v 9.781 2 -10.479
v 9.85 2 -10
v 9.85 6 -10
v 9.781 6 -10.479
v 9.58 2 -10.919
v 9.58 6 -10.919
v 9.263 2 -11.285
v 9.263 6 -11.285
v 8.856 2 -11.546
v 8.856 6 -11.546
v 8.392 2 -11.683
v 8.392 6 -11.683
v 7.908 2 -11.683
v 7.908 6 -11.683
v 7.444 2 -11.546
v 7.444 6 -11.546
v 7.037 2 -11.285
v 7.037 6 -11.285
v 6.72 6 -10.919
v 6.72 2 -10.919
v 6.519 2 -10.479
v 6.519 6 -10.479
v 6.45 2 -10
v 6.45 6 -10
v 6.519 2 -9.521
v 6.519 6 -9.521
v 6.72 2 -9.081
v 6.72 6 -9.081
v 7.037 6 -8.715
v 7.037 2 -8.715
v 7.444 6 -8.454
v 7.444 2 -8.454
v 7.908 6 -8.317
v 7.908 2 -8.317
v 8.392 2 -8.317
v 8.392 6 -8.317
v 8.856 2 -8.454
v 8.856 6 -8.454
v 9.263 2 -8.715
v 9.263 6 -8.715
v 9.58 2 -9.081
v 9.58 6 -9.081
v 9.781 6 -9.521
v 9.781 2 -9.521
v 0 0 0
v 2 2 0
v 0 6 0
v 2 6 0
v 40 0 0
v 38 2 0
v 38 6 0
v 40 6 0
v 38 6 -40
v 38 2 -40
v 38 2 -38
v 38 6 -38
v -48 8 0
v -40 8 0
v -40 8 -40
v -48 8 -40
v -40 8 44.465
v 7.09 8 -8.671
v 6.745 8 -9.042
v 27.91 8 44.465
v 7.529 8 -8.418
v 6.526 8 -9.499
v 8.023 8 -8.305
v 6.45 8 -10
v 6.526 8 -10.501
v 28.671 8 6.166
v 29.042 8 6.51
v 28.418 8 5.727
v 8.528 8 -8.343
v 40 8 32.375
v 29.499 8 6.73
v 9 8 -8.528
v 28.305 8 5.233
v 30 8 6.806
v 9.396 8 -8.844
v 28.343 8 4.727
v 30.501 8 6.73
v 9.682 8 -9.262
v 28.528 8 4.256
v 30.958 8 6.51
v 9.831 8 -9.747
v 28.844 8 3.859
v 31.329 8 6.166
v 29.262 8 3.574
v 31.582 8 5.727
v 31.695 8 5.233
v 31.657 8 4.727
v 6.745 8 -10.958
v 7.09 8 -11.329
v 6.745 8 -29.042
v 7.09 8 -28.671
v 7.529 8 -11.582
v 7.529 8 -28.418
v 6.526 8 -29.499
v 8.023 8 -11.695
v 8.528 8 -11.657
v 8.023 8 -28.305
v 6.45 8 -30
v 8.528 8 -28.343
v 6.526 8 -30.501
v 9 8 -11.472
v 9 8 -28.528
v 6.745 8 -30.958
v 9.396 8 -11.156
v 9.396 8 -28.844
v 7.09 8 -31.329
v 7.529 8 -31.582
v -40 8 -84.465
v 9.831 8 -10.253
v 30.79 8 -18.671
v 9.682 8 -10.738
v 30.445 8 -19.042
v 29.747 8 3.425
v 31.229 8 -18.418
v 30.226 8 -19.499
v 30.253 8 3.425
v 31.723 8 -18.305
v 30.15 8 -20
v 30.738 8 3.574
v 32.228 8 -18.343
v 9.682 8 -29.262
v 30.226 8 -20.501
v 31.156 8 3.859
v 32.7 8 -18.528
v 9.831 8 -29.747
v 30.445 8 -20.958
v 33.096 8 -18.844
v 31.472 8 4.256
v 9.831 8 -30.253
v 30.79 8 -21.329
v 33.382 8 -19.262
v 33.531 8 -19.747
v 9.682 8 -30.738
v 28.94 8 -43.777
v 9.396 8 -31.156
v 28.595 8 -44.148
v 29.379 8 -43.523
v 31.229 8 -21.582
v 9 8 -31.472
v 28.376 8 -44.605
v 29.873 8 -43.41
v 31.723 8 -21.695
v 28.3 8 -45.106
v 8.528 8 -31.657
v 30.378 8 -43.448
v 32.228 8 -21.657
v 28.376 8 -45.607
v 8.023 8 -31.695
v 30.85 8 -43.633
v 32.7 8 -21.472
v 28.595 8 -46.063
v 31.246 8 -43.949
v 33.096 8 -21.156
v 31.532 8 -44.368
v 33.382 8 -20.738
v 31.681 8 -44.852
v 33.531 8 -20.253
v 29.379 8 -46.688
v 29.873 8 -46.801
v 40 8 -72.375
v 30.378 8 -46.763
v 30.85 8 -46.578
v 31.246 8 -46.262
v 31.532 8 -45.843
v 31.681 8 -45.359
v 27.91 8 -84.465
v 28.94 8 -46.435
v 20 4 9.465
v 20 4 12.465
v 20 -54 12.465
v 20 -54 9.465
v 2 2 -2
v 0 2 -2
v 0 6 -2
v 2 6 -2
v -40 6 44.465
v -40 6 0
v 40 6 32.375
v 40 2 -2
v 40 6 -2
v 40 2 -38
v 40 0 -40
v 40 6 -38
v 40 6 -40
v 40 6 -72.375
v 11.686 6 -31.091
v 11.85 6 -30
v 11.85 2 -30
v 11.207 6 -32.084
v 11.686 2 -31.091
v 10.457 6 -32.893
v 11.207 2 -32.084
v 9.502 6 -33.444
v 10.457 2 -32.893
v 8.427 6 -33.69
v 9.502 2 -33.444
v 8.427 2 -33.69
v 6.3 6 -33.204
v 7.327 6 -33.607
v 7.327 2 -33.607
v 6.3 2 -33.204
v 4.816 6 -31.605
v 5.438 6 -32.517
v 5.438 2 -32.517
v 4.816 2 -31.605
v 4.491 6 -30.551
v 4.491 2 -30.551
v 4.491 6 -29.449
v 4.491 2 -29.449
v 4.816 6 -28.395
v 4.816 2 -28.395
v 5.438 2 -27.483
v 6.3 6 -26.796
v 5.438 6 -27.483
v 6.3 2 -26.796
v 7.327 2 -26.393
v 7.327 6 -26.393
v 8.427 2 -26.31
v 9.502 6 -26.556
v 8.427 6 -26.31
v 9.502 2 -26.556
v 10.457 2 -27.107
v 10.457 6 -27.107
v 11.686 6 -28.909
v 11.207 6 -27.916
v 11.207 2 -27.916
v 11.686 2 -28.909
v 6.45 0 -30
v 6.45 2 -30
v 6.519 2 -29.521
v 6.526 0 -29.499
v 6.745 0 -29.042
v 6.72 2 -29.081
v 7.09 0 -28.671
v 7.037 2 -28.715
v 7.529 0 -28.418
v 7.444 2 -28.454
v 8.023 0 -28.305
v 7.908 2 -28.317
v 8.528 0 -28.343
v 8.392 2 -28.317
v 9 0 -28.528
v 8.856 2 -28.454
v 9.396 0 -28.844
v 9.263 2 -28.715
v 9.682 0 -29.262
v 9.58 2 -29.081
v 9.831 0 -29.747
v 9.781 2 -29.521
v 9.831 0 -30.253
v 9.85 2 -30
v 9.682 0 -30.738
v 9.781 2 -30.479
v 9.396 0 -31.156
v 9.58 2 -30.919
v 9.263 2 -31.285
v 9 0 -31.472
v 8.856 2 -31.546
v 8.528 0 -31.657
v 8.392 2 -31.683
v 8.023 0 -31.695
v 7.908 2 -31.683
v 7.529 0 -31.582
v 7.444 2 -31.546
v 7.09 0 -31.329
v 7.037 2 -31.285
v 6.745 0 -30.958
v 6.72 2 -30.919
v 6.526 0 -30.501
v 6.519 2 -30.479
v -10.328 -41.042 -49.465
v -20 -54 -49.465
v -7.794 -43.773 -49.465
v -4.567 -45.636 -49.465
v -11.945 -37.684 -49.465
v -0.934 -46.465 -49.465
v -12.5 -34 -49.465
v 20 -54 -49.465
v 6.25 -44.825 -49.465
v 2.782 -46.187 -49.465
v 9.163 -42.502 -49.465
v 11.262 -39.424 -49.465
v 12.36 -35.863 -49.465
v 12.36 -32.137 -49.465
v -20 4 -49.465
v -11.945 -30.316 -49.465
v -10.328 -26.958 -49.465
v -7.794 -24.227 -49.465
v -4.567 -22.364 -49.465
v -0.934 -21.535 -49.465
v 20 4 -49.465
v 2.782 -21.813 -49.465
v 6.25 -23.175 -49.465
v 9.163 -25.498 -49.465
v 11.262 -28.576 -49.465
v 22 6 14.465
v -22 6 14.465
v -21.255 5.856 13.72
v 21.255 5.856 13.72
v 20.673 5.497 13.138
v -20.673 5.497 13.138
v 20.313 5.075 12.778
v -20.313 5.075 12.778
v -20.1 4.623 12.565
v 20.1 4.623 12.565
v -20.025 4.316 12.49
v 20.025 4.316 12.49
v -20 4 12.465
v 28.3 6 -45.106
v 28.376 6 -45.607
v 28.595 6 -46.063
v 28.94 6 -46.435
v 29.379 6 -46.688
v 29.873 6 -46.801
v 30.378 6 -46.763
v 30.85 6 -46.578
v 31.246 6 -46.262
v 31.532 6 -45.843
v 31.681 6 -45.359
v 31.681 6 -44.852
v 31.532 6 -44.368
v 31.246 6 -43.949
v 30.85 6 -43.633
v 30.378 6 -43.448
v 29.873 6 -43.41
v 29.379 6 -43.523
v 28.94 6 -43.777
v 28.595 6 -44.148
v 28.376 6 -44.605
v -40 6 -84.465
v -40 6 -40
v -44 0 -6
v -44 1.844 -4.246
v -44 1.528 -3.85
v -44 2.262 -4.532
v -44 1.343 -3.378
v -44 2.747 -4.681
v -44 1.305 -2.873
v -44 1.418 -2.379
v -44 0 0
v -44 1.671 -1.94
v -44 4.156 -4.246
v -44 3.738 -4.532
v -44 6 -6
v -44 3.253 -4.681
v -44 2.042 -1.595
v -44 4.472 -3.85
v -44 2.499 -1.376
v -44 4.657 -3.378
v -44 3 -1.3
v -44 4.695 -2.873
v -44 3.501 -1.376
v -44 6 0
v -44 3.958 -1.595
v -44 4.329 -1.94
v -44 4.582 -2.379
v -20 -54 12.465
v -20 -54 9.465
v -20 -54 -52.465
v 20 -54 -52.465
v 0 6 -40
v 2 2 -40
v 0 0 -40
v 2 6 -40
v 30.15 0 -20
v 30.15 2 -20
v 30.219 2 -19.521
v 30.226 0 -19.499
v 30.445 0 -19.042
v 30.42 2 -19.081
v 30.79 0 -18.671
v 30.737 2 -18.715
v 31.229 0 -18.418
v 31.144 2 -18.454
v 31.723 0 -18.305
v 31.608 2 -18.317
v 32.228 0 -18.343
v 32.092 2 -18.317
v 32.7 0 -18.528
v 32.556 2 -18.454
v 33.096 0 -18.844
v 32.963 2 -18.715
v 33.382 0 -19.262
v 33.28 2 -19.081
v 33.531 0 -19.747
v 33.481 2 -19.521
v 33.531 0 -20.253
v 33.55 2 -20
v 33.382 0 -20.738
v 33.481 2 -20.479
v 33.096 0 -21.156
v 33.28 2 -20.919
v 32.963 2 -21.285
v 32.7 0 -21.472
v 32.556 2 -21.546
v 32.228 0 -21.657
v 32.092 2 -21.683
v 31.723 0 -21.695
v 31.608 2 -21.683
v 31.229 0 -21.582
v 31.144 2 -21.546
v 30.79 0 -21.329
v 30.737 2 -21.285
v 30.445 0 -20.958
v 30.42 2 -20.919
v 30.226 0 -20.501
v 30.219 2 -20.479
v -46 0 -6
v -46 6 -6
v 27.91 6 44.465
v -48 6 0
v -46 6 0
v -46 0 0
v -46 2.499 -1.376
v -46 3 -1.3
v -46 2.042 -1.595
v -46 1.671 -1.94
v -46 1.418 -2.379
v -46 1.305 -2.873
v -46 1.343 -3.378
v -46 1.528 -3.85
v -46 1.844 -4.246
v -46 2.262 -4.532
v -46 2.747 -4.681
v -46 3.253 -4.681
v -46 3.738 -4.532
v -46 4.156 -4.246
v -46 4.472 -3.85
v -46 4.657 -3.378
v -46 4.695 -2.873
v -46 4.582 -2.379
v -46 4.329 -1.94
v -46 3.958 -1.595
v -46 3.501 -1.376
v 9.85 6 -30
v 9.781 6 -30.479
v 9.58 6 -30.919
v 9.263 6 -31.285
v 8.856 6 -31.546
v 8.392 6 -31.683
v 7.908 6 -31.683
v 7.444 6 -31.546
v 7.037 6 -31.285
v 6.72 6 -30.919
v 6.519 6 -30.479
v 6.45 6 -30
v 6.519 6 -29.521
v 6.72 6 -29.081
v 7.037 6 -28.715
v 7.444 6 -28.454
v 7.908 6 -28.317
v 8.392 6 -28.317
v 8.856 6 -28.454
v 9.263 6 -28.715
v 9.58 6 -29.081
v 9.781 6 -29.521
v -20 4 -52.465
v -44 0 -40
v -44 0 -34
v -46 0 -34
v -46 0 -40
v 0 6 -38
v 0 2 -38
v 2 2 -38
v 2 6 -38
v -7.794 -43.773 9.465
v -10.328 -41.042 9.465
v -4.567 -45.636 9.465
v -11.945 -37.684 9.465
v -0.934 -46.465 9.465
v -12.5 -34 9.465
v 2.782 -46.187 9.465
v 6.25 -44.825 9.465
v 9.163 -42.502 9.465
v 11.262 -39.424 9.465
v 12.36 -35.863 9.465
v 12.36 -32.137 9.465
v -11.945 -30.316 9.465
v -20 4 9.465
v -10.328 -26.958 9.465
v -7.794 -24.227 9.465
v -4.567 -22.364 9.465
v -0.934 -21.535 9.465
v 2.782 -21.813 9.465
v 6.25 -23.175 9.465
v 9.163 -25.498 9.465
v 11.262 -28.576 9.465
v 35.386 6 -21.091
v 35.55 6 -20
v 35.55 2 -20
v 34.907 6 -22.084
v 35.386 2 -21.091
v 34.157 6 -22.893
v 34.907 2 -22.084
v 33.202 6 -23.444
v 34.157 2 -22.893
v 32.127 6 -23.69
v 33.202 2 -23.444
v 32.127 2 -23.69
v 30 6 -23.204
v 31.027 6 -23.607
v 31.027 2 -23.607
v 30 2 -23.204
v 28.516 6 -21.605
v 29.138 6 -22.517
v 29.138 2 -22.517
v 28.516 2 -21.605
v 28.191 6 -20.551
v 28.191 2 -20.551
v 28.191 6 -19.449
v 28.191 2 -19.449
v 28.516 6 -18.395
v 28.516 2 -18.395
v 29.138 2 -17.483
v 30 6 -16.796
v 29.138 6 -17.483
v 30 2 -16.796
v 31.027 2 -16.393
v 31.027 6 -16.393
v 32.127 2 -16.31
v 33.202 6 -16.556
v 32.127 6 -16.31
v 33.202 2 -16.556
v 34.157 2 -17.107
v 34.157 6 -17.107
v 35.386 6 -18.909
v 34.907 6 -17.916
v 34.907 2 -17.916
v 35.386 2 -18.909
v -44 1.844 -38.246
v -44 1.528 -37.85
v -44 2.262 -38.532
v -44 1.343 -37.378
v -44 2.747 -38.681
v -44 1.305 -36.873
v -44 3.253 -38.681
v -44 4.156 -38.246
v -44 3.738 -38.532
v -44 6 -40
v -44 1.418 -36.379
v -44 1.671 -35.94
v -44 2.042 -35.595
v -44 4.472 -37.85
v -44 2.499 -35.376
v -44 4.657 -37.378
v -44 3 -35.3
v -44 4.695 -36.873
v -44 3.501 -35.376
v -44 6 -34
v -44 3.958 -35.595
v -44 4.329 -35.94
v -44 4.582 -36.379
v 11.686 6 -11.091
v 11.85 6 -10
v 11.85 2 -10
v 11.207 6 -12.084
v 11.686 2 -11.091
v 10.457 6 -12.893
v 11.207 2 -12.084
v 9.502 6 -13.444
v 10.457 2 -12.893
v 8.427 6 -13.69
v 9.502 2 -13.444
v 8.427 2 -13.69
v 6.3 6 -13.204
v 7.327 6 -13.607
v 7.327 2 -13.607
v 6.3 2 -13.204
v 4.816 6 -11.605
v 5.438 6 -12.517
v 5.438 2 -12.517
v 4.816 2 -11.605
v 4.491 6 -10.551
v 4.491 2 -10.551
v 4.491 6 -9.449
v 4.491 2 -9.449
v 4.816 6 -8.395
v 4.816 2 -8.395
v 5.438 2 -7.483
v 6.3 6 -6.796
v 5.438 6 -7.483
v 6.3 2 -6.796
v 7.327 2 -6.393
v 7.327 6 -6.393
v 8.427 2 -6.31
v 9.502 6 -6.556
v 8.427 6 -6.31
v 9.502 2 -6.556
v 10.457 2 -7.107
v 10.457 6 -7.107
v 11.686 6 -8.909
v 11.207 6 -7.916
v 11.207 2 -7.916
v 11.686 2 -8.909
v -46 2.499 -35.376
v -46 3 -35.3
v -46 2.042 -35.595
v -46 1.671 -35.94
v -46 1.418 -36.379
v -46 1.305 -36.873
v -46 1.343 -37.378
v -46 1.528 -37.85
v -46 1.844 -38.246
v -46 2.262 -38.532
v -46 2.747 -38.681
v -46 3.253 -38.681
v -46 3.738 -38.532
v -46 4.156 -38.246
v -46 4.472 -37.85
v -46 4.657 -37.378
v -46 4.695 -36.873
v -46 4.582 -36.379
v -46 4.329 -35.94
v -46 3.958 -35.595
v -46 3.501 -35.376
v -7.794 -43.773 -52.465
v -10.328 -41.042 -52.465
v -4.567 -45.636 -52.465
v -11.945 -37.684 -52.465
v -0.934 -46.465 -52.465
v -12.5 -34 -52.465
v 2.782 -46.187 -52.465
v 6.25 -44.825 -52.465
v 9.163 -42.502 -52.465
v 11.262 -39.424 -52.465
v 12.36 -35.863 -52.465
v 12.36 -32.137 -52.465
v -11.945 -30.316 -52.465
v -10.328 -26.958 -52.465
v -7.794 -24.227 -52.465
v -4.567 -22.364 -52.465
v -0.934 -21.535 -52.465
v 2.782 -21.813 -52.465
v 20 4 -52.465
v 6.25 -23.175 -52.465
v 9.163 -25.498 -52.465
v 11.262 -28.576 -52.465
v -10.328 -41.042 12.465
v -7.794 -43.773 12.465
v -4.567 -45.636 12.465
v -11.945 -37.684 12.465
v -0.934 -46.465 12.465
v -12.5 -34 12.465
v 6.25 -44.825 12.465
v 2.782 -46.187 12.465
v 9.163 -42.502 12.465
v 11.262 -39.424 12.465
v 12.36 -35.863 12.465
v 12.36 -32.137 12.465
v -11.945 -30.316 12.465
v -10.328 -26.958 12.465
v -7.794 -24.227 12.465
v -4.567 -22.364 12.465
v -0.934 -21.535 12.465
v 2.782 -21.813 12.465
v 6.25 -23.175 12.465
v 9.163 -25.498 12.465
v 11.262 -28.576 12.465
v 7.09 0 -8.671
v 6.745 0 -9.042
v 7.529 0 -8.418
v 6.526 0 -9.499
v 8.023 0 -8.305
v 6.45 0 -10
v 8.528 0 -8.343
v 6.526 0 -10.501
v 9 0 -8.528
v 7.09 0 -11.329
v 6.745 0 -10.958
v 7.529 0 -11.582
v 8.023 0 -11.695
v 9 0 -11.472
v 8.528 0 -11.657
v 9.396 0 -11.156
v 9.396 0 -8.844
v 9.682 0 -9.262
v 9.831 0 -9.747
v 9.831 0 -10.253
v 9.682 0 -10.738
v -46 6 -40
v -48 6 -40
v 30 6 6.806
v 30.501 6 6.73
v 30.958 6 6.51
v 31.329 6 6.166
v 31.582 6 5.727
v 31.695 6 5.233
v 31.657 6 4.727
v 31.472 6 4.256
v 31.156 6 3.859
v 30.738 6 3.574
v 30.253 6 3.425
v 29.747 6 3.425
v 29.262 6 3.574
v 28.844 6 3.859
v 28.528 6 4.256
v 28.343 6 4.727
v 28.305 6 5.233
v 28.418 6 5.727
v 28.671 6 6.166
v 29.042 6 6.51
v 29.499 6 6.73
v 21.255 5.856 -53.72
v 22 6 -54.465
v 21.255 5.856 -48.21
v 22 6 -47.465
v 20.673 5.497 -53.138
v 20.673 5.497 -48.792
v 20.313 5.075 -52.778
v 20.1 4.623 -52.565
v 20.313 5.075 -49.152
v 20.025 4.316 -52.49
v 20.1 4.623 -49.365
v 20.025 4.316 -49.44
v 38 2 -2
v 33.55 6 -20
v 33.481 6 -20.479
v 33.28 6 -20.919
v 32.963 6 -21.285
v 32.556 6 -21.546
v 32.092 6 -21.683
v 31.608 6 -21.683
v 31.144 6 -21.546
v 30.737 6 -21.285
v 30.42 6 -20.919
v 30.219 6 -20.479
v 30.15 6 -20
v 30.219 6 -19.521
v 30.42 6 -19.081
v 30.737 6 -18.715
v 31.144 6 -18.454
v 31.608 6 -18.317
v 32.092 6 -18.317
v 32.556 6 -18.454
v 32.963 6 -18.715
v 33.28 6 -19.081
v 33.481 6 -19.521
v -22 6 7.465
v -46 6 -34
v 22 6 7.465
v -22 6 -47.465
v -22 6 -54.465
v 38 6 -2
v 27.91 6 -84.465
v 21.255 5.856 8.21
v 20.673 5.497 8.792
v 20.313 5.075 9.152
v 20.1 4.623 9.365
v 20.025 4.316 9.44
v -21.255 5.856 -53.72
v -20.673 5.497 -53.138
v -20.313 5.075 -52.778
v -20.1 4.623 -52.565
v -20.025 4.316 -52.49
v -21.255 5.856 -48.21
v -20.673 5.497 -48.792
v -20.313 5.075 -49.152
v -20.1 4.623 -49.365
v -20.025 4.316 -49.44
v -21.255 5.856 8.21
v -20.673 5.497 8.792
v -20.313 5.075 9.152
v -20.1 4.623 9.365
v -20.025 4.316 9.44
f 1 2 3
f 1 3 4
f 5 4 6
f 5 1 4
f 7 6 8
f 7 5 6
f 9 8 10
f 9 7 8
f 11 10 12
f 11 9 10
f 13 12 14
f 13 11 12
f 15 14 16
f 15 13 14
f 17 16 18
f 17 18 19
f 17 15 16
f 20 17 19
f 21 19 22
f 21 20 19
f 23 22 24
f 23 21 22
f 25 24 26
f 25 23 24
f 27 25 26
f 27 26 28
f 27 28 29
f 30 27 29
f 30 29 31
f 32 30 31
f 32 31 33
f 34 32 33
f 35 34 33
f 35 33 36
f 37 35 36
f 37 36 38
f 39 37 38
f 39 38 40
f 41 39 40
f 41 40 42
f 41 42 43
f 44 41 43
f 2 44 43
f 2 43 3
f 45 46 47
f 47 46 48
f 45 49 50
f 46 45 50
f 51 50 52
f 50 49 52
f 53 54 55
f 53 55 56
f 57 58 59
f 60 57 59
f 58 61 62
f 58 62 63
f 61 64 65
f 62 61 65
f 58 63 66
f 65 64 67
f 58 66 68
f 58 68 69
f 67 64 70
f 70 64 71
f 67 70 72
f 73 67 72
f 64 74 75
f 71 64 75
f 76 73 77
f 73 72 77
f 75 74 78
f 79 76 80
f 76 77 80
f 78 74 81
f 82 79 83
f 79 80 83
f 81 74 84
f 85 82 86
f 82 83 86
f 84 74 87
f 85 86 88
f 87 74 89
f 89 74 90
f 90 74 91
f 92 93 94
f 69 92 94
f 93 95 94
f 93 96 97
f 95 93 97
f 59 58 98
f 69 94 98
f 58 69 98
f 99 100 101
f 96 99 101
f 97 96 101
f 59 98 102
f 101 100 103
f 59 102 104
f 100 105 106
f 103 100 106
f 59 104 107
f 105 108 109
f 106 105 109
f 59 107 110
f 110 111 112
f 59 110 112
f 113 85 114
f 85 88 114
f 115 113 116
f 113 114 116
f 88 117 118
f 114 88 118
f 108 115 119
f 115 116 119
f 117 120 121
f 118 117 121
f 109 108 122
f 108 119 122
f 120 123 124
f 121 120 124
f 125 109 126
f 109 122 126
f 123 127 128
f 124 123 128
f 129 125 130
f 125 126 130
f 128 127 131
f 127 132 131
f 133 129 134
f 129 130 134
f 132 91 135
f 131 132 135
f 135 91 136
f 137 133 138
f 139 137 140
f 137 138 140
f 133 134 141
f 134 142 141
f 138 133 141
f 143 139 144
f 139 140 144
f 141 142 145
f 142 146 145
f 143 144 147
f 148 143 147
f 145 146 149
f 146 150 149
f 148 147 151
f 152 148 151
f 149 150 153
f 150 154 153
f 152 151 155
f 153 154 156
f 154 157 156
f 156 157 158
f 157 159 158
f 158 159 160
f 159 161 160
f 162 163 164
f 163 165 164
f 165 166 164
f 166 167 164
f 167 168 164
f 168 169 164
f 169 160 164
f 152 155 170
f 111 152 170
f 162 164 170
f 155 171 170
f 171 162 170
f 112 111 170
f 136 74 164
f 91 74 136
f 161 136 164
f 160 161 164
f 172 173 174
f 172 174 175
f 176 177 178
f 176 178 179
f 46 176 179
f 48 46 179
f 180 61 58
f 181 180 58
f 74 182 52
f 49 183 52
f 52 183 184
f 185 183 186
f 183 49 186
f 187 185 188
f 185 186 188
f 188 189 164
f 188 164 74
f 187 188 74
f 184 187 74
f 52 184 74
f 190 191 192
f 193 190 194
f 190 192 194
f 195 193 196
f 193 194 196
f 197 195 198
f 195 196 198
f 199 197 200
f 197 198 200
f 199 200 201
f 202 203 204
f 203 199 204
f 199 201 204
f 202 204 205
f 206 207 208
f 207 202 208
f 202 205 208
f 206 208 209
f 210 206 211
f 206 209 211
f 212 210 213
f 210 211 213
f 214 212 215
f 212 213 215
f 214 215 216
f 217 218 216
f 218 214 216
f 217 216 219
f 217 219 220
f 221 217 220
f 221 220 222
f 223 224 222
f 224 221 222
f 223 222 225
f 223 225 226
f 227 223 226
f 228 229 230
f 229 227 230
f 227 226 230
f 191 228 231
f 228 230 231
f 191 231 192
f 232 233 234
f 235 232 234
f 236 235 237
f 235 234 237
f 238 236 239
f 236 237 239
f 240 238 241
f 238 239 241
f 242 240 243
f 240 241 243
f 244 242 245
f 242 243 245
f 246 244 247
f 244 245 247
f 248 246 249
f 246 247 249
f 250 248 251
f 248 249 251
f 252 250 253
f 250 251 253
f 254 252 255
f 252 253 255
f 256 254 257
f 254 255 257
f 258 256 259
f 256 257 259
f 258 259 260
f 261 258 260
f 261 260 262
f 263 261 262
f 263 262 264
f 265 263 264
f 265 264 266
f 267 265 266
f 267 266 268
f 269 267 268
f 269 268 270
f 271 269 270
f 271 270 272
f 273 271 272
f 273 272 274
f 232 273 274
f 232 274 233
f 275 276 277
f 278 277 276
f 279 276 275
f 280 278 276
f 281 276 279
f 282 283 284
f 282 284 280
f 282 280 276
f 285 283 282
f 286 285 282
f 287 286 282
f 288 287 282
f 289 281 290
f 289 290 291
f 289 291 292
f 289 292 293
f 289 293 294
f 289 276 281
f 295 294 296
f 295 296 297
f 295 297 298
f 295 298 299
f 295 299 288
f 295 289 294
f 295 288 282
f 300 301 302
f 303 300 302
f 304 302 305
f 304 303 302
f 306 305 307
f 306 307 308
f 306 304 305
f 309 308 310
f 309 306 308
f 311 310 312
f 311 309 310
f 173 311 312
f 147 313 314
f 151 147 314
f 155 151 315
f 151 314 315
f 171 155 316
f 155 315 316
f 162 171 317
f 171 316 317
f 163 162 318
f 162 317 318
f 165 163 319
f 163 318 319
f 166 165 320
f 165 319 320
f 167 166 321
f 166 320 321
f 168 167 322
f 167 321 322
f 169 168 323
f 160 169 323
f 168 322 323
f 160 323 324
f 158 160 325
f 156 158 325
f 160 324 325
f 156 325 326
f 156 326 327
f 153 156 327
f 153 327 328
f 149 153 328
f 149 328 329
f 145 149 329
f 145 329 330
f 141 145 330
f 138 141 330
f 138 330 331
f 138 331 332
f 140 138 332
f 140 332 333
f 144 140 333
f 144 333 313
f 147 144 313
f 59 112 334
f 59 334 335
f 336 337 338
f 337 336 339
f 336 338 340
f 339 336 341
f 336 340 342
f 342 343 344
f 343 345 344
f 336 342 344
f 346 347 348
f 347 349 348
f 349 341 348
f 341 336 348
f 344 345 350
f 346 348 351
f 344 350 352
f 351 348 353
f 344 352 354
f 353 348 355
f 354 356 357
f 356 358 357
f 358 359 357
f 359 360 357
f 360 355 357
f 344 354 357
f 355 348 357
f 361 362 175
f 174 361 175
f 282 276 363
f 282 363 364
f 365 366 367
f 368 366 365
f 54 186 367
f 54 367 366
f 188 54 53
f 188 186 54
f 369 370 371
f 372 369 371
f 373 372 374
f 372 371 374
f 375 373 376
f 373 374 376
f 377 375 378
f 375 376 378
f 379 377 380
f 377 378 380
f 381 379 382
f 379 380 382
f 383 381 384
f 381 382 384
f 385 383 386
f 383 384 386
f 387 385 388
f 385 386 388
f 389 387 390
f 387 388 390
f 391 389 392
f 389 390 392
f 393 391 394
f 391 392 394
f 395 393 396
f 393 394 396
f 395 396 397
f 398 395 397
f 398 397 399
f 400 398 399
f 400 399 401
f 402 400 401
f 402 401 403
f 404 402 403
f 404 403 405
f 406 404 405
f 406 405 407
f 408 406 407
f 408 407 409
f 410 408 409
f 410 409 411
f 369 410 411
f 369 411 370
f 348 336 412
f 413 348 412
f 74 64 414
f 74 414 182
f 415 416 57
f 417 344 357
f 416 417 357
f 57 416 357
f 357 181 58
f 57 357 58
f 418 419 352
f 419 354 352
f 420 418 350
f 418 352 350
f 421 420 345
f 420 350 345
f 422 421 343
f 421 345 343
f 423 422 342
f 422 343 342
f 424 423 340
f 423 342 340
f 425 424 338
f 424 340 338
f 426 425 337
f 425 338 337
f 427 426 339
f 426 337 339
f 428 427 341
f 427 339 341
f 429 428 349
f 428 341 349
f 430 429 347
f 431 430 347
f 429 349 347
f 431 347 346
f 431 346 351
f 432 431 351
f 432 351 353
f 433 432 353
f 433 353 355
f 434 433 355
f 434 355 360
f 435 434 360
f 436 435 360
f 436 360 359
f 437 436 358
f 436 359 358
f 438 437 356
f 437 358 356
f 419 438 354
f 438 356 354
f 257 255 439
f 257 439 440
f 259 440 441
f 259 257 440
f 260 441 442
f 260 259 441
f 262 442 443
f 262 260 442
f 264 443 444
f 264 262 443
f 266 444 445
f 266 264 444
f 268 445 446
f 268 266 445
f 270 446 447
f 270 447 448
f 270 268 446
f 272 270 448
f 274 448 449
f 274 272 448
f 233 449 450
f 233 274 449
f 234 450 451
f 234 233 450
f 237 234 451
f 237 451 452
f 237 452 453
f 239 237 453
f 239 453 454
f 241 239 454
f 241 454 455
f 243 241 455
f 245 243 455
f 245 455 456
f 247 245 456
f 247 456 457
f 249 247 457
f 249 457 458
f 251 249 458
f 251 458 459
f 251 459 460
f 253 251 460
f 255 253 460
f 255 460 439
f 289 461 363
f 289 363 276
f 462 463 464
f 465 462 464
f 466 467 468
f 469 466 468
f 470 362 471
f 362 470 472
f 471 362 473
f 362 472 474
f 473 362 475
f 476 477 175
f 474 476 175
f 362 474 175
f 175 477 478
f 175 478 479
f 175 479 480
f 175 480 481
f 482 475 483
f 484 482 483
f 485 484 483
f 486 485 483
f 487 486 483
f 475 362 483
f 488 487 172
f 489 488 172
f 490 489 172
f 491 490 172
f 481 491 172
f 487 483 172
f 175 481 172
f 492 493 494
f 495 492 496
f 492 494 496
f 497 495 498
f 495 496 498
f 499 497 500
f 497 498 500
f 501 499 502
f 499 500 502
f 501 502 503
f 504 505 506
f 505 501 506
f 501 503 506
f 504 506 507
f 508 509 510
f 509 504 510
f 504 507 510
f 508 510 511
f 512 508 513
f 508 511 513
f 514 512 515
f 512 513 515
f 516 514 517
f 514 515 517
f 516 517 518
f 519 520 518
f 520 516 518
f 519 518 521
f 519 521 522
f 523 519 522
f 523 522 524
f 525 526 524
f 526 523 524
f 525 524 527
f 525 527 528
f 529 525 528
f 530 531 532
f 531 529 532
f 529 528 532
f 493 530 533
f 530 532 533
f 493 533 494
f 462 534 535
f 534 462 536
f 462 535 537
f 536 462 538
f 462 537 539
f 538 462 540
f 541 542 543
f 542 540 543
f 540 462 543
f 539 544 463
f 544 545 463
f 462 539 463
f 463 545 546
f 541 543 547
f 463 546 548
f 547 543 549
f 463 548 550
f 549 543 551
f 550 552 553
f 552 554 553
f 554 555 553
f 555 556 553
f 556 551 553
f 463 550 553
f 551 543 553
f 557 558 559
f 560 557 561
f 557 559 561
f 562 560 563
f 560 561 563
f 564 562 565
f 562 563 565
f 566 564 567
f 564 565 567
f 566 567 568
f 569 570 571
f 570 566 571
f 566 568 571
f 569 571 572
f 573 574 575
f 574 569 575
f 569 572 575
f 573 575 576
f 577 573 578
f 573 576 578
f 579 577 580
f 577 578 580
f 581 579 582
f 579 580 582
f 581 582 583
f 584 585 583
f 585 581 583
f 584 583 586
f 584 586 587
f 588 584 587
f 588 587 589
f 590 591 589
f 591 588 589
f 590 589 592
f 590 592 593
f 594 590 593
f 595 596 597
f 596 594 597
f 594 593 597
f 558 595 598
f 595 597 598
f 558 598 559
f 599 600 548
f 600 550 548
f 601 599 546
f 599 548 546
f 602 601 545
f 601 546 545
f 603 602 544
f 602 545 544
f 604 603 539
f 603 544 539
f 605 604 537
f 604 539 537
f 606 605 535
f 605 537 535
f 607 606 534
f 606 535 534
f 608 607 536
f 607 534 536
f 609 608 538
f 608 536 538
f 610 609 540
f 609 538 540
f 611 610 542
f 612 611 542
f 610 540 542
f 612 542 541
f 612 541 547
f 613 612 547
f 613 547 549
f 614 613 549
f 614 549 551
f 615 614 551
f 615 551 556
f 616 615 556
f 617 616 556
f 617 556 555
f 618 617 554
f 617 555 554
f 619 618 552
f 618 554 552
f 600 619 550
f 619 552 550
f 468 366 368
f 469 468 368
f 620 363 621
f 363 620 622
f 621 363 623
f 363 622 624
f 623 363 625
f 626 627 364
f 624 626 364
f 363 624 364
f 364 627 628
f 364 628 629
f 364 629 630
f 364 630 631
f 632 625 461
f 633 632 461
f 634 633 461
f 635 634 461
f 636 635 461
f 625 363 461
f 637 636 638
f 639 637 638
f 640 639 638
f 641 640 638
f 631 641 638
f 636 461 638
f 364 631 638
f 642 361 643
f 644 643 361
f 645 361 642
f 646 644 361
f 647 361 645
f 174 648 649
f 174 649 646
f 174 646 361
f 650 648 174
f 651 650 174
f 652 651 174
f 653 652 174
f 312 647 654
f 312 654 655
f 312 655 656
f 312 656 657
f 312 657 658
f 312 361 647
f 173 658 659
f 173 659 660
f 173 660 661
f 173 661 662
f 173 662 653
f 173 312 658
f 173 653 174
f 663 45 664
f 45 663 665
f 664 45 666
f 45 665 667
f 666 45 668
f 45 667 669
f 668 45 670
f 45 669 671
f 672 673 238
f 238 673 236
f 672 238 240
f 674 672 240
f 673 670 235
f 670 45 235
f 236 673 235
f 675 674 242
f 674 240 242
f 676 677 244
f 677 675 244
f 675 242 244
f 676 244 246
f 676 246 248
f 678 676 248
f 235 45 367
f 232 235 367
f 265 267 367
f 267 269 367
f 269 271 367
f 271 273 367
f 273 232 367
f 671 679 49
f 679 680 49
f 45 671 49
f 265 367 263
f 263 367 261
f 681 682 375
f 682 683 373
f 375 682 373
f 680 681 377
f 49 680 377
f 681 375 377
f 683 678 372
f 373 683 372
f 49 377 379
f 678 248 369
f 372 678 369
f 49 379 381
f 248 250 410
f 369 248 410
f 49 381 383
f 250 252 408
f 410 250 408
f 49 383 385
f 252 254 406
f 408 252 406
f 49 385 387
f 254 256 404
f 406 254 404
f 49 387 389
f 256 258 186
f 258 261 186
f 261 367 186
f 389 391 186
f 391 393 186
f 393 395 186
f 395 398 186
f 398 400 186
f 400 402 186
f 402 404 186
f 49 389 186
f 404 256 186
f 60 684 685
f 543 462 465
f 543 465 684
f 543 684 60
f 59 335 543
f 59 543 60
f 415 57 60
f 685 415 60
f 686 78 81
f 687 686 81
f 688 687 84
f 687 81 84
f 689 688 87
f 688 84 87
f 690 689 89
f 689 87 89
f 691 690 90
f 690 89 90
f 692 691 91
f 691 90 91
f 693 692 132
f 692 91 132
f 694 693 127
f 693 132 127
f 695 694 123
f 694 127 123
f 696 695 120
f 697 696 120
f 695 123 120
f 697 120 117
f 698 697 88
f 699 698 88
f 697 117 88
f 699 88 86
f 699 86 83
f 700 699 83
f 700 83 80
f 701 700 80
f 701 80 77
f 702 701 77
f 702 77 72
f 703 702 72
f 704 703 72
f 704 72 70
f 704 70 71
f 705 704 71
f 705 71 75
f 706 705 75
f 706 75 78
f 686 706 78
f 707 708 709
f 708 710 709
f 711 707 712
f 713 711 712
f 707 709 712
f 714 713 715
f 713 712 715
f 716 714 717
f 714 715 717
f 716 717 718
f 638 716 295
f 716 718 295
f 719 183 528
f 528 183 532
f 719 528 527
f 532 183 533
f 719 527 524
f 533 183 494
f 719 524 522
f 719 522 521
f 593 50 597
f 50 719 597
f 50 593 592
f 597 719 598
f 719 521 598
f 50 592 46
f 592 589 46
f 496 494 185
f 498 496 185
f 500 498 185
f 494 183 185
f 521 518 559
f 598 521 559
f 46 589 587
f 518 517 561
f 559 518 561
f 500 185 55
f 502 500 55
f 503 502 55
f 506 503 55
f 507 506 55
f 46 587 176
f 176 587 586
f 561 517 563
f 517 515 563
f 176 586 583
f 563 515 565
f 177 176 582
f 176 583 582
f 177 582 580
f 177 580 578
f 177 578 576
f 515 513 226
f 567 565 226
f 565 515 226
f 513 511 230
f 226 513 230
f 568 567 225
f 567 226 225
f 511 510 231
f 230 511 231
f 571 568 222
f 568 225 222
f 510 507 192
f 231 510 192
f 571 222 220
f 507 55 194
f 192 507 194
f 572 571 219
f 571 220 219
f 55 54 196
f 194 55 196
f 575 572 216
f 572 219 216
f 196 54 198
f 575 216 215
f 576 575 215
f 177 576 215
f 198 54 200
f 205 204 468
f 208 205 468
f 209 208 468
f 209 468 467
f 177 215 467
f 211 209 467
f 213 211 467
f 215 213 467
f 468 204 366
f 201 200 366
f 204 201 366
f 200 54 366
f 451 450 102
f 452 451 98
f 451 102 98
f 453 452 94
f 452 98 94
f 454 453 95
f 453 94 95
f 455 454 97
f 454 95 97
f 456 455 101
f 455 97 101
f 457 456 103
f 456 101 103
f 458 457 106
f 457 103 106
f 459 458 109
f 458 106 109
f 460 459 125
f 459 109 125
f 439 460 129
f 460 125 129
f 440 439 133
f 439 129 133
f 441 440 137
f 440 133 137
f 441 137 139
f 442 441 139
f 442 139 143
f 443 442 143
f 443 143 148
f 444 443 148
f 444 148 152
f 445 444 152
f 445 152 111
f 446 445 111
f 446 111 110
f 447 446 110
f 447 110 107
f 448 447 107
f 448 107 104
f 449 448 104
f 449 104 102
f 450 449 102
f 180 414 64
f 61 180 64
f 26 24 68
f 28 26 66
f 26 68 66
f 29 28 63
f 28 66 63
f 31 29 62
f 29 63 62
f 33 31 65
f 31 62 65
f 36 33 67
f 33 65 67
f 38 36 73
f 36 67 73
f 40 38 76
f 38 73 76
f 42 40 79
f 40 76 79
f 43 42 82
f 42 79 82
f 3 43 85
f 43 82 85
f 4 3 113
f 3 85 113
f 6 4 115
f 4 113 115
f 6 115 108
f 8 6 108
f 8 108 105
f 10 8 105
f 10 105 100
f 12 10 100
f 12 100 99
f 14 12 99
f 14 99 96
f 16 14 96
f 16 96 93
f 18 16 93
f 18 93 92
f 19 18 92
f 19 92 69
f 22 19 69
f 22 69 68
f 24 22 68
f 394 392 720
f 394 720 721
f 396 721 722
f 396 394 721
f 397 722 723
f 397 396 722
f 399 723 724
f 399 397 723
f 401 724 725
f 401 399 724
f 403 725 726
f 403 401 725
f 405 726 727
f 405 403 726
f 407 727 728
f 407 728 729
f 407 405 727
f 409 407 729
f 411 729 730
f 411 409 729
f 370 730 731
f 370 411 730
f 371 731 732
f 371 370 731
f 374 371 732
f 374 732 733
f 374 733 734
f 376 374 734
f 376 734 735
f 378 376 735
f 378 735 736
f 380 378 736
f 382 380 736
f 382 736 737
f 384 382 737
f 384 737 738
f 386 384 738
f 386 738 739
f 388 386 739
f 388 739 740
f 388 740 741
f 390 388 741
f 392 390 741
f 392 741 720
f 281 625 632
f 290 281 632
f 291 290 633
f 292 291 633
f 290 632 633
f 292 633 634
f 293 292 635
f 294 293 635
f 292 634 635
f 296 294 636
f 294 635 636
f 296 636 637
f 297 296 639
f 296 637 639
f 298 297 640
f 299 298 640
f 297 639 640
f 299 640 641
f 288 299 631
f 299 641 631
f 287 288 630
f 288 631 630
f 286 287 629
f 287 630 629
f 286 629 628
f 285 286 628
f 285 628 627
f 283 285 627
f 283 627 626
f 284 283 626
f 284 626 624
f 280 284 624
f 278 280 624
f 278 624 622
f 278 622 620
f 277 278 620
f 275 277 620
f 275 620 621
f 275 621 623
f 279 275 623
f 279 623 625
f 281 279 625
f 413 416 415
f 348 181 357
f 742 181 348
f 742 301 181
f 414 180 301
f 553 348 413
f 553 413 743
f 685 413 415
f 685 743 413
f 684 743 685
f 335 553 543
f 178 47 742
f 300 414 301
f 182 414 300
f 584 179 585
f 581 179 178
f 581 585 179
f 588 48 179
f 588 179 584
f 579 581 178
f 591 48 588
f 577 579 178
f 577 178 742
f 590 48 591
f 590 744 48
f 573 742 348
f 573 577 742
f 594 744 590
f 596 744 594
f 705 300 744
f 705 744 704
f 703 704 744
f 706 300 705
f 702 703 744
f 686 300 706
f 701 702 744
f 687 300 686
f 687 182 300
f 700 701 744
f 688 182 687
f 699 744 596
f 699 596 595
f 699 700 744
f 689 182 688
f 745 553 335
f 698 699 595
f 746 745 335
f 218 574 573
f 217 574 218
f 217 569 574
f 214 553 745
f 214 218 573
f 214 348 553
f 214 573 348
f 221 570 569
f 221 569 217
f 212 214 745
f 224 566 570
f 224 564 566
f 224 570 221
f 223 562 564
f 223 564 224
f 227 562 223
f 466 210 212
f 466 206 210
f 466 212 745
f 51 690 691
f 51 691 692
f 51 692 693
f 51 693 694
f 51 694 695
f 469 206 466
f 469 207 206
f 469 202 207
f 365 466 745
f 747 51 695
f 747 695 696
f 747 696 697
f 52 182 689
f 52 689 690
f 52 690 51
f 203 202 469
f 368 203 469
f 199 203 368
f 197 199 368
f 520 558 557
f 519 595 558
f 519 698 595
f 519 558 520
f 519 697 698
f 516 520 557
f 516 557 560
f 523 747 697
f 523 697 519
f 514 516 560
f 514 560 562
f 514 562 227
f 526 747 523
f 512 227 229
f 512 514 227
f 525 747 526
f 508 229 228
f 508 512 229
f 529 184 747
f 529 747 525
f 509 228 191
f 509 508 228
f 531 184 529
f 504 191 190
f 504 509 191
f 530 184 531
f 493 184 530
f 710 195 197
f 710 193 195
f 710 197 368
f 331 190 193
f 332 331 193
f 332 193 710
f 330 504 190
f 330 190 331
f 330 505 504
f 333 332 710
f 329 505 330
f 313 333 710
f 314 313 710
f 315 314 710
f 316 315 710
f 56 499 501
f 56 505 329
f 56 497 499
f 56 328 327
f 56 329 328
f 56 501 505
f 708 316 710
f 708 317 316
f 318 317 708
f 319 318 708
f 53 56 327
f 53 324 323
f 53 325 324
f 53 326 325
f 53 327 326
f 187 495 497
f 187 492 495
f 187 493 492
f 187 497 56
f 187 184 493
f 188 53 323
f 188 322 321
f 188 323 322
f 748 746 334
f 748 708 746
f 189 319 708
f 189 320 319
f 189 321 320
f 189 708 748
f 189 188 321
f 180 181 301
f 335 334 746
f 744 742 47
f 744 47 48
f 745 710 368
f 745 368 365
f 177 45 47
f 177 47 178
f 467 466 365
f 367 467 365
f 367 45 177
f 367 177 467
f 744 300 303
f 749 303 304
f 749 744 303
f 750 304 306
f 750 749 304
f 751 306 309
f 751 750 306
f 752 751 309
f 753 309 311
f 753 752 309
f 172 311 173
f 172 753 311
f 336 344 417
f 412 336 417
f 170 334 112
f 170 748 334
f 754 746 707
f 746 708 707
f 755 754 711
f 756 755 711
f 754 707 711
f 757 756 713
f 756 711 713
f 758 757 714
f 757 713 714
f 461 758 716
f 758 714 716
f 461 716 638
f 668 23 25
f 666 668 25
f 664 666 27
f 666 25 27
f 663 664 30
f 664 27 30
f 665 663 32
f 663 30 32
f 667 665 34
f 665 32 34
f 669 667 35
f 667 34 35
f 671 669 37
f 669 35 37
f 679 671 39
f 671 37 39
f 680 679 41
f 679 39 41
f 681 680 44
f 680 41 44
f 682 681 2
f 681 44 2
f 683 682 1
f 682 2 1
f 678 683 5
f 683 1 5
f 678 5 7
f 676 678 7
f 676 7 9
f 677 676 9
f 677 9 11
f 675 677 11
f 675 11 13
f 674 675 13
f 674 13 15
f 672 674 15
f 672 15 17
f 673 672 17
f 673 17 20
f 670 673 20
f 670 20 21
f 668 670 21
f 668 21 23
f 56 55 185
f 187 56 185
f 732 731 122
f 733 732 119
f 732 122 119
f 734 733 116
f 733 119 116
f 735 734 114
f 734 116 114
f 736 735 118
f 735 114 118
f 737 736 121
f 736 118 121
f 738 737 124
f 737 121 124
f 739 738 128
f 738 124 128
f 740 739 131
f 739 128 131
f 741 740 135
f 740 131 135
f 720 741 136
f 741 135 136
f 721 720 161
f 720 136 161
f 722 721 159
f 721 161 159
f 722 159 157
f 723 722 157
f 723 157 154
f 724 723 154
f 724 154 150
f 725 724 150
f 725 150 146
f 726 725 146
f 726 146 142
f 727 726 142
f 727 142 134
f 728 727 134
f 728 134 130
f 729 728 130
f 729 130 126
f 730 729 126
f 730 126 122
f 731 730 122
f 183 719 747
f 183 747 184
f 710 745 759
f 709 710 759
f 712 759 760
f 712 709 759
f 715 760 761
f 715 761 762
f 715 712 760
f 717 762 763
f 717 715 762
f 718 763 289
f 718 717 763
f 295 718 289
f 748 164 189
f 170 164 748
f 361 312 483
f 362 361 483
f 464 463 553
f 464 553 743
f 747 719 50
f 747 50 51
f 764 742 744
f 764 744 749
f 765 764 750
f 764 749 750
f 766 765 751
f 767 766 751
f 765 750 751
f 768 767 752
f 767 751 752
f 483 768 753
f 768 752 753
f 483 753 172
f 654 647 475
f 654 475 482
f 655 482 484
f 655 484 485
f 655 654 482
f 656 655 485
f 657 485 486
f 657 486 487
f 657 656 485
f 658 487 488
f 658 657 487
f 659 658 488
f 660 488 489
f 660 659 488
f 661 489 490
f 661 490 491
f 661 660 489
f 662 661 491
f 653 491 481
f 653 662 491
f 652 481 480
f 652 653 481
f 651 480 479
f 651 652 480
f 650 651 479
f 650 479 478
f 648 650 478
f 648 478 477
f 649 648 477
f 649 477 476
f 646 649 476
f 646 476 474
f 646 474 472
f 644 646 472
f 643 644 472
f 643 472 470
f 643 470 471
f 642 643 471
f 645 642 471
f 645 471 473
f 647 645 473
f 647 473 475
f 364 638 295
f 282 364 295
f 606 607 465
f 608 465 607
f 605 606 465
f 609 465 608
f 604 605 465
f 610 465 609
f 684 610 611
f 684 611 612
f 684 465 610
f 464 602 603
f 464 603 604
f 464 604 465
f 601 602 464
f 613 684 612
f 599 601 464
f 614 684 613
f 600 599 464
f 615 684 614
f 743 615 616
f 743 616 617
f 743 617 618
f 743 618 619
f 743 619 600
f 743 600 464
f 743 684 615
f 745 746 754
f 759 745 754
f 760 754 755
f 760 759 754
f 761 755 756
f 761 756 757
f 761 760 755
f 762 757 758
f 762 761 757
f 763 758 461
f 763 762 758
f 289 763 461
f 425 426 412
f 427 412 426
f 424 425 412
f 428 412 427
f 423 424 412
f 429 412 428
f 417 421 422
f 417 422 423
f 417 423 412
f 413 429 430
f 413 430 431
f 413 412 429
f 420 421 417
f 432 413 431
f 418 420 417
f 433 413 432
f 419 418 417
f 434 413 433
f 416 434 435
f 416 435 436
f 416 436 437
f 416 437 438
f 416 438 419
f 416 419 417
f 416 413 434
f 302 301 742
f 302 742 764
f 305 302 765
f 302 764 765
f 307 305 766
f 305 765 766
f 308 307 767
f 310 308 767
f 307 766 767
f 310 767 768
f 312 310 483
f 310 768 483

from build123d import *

# Parameters (mm, degrees)
SKETCH1_W                = 40
SKETCH1_H                = 40
BOSS_EXTRUDE1_DEPTH      = 2
SKETCH10_W               = 40
SKETCH10_H               = 2
BOSS_EXTRUDE4_DEPTH      = 4
SKETCH11_W               = 40
SKETCH11_H               = 40
BOSS_EXTRUDE5_DEPTH      = 2
M3_CLEARANCE_HOLE1_D     = 3.4
SKETCH5_W                = 40
SKETCH5_H                = 2
BOSS_EXTRUDE2_DEPTH      = 48
SKETCH6_W                = 2
SKETCH6_H                = 40
BOSS_EXTRUDE3_DEPTH      = 6
SKETCH7_W                = 2
SKETCH7_H                = 28
CUT_EXTRUDE1_DEPTH       = 6
M3_CLEARANCE_HOLE2_D     = 3.4
M3_CLEARANCE_HOLE2_DEPTH = 2
M3_CLEARANCE_HOLE2_TIP   = 1.021463052
SKETCH12_W               = 36
SKETCH12_H               = 4
CUT_EXTRUDE2_DEPTH       = 63.992062992
EXTRUDE_THIN1_REACH      = 64.769
SKETCH13_R               = 3.7
SKETCH13_R_2             = 1.7
SKETCH14_W               = 40
SKETCH14_H               = 2
BOSS_EXTRUDE6_DEPTH      = 44.465
M3_CLEARANCE_HOLE3_D     = 3.4
SKETCH19_W               = 40
SKETCH19_H               = 2
BOSS_EXTRUDE7_DEPTH      = 44.465
SKETCH20_R               = 1.7
CUT_EXTRUDE3_DEPTH       = 98.479927293
CUT_EXTRUDE4_DEPTH       = 98.479927293
SKETCH24_W               = 44.465
SKETCH24_H               = 2
BOSS_EXTRUDE9_DEPTH      = 40
SKETCH22_W               = 40
SKETCH22_H               = 3
BOSS_EXTRUDE8_DEPTH      = 60
FILLET1_R                = 2
CUT_EXTRUDE5_REACH       = 122.894
SKETCH23_R               = 12.5
FILLET1_OF_MIRROR1_R     = 2


with BuildPart() as part:
    # Sketch1 → Boss-Extrude1 (new body)
    with BuildSketch(Plane(origin=(0, 0, 0), x_dir=(1, 0, 0), z_dir=(0, 1, 0))):
        with Locations((20, 20)):
            Rectangle(SKETCH1_W, SKETCH1_H)
    extrude(amount=BOSS_EXTRUDE1_DEPTH)

    # Sketch10 → Boss-Extrude4 (add)
    with BuildSketch(Plane(origin=(0, 2, 0), x_dir=(1, 0, 0), z_dir=(0, 1, 0))):
        with Locations((20, 1)):
            Rectangle(SKETCH10_W, SKETCH10_H)
        with Locations((20, 39)):
            Rectangle(SKETCH10_W, SKETCH10_H)
    extrude(amount=BOSS_EXTRUDE4_DEPTH)

    # Sketch11 → Boss-Extrude5 (add)
    with BuildSketch(Plane(origin=(0, 6, 0), x_dir=(1, 0, 0), z_dir=(0, 1, 0))):
        with Locations((20, 20)):
            Rectangle(SKETCH11_W, SKETCH11_H)
    extrude(amount=BOSS_EXTRUDE5_DEPTH)

    # M3 Clearance Hole1 (through all)
    with Locations(Plane.XZ):
        with Locations((8.15, -30), (8.15, -10), (31.85, -20)):
            Hole(M3_CLEARANCE_HOLE1_D / 2)

    # Sketch5 → Boss-Extrude2 (add)
    with BuildSketch(Plane(origin=(0, 0, 0), x_dir=(0, 0, -1), z_dir=(1, 0, 0))):
        with Locations((20, 7)):
            Rectangle(SKETCH5_W, SKETCH5_H)
    extrude(amount=-BOSS_EXTRUDE2_DEPTH)

    # Sketch6 → Boss-Extrude3 (add)
    with BuildSketch(Plane(origin=(-6, 6, 0), x_dir=(-1, 0, 0), z_dir=(0, 1, 0))):
        with Locations((39, -20)):
            Rectangle(SKETCH6_W, SKETCH6_H)
    extrude(amount=-BOSS_EXTRUDE3_DEPTH)

    # Sketch7 → Cut-Extrude1 (cut)
    with BuildSketch(Plane(origin=(46, 0, 0), x_dir=(-1, 0, 0), z_dir=(0, 1, 0))):
        with Locations((91, -20)):
            Rectangle(SKETCH7_W, SKETCH7_H)
    extrude(amount=CUT_EXTRUDE1_DEPTH, mode=Mode.SUBTRACT)

    # M3 Clearance Hole2
    with Locations(Plane(origin=(-46, 0, 0), x_dir=(0, 0, -1), z_dir=(-1, 0, 0))):
        with Locations((3, -3), (37, -3)):
            Hole(M3_CLEARANCE_HOLE2_D / 2, depth=M3_CLEARANCE_HOLE2_DEPTH)
            with Locations((0, 0, -(M3_CLEARANCE_HOLE2_DEPTH + M3_CLEARANCE_HOLE2_TIP / 2))):  # 118° drill point
                Cone(0, M3_CLEARANCE_HOLE2_D / 2, M3_CLEARANCE_HOLE2_TIP, mode=Mode.SUBTRACT)

    # Sketch12 → Cut-Extrude2 (cut, through all)
    with BuildSketch(Plane(origin=(0, 0, -40), x_dir=(-1, 0, 0), z_dir=(0, 0, -1))):
        with Locations((-20, 4)):
            Rectangle(SKETCH12_W, SKETCH12_H)
    extrude(amount=-CUT_EXTRUDE2_DEPTH, mode=Mode.SUBTRACT)

    # Sketch13 → Extrude-Thin1 (add, up to next)
    with BuildSketch(Plane(origin=(0, 2, 0), x_dir=(1, 0, 0), z_dir=(0, 1, 0)), mode=Mode.PRIVATE) as extrude_thin1_sk1:
        with Locations((31.85, 20)):
            Circle(SKETCH13_R)
        with Locations((31.85, 20)):
            Circle(SKETCH13_R_2, mode=Mode.SUBTRACT)
    extrude_thin1_tool1 = extrude(extrude_thin1_sk1.sketch, amount=EXTRUDE_THIN1_REACH, mode=Mode.PRIVATE) - part.part
    # Sketch13 → Extrude-Thin1 (add, up to next)
    with BuildSketch(Plane(origin=(0, 2, 0), x_dir=(1, 0, 0), z_dir=(0, 1, 0)), mode=Mode.PRIVATE) as extrude_thin1_sk2:
        with Locations((8.15, 10)):
            Circle(SKETCH13_R)
        with Locations((8.15, 10)):
            Circle(SKETCH13_R_2, mode=Mode.SUBTRACT)
    extrude_thin1_tool2 = extrude(extrude_thin1_sk2.sketch, amount=EXTRUDE_THIN1_REACH, mode=Mode.PRIVATE) - part.part
    # Sketch13 → Extrude-Thin1 (add, up to next)
    with BuildSketch(Plane(origin=(0, 2, 0), x_dir=(1, 0, 0), z_dir=(0, 1, 0)), mode=Mode.PRIVATE) as extrude_thin1_sk3:
        with Locations((8.15, 30)):
            Circle(SKETCH13_R)
        with Locations((8.15, 30)):
            Circle(SKETCH13_R_2, mode=Mode.SUBTRACT)
    extrude_thin1_tool3 = extrude(extrude_thin1_sk3.sketch, amount=EXTRUDE_THIN1_REACH, mode=Mode.PRIVATE) - part.part
    add(extrude_thin1_tool1.solids().sort_by_distance((28.254652, 2, -20))[0])
    add(extrude_thin1_tool2.solids().sort_by_distance((4.554652, 2, -10))[0])
    add(extrude_thin1_tool3.solids().sort_by_distance((4.554652, 2, -30))[0])

    # Sketch14 → Boss-Extrude6 (add)
    with BuildSketch(Plane(origin=(0, 0, -40), x_dir=(-1, 0, 0), z_dir=(0, 0, -1))):
        with Locations((-20, 7)):
            Rectangle(SKETCH14_W, SKETCH14_H)
    extrude(amount=BOSS_EXTRUDE6_DEPTH)

    # M3 Clearance Hole3 (through all)
    with Locations(Plane(origin=(0, 8, 0), x_dir=(1, 0, 0), z_dir=(0, 1, 0))):
        with Locations((30, 45.10564971)):
            Hole(M3_CLEARANCE_HOLE3_D / 2)

    # Sketch19 → Boss-Extrude7 (add)
    with BuildSketch(Plane.XY):
        with Locations((20, 7)):
            Rectangle(SKETCH19_W, SKETCH19_H)
    extrude(amount=BOSS_EXTRUDE7_DEPTH)

    # Sketch20 → Cut-Extrude3 (cut, through all)
    with BuildSketch(Plane(origin=(0, 8, 0), x_dir=(1, 0, 0), z_dir=(0, 1, 0))):
        with Locations(Location((30, -5.10564971, 0), (0, 0, 270))):
            Circle(SKETCH20_R)
    extrude(amount=-CUT_EXTRUDE3_DEPTH, mode=Mode.SUBTRACT)

    # Sketch21 → Cut-Extrude4 (cut, through all)
    with BuildSketch(Plane(origin=(0, 8, 0), x_dir=(1, 0, 0), z_dir=(0, 1, 0))):
        Polygon((27.91, -44.465), (40, -32.375), (40, -44.465), align=None)
        Polygon((27.91, 84.465), (40, 84.465), (40, 72.375), align=None)
    extrude(amount=-CUT_EXTRUDE4_DEPTH, mode=Mode.SUBTRACT)

    # Sketch24 → Boss-Extrude9 (add)
    with BuildSketch(Plane.ZY):
        with Locations((-62.2325, 7)):
            Rectangle(SKETCH24_W, SKETCH24_H)
    boss_extrude9 = extrude(amount=BOSS_EXTRUDE9_DEPTH)

    # Sketch22 → Boss-Extrude8 (add)
    with BuildSketch(Plane.XZ.offset(-6)):
        with Locations((0, -50.965)):
            Rectangle(SKETCH22_W, SKETCH22_H)
    boss_extrude8 = extrude(amount=BOSS_EXTRUDE8_DEPTH)

    # Fillet1
    fillet1_edges = [part.edges().sort_by_distance(p)[0] for p in [
        (20, 6, -50.965),
        (0, 6, -49.465),
        (-20, 6, -50.965),
        (0, 6, -52.465),
    ]]
    fillet(fillet1_edges, radius=FILLET1_R)

    # Sketch23 → Cut-Extrude5 (cut, up to next)
    with BuildSketch(Plane(origin=(0, 0, -52.465), x_dir=(-1, 0, 0), z_dir=(0, 0, -1)), mode=Mode.PRIVATE) as cut_extrude5_sk1:
        with Locations((0, -34)):
            Circle(SKETCH23_R)
    cut_extrude5_tool1 = extrude(cut_extrude5_sk1.sketch, amount=-CUT_EXTRUDE5_REACH, mode=Mode.PRIVATE) & part.part
    cut_extrude5 = cut_extrude5_tool1.solids().sort_by_distance((0, -34, -52.465))[0]
    add(cut_extrude5, mode=Mode.SUBTRACT)

    # Mirror1: Boss-Extrude9, Boss-Extrude8, Cut-Extrude5 across plane
    add(boss_extrude9.mirror(Plane(origin=(0, 0, -20), x_dir=(1, 0, 0), z_dir=(0, 0, -1))))
    add(boss_extrude8.mirror(Plane(origin=(0, 0, -20), x_dir=(1, 0, 0), z_dir=(0, 0, -1))))
    add(cut_extrude5.mirror(Plane(origin=(0, 0, -20), x_dir=(1, 0, 0), z_dir=(0, 0, -1))), mode=Mode.SUBTRACT)

    # Fillet1 of Mirror1
    fillet1_of_mirror1_edges = [part.edges().sort_by_distance(p)[0] for p in [
        (20, 6, 10.965),
        (0, 6, 9.465),
        (-20, 6, 10.965),
        (0, 6, 12.465),
    ]]
    fillet(fillet1_of_mirror1_edges, radius=FILLET1_OF_MIRROR1_R)


solid = part.part
